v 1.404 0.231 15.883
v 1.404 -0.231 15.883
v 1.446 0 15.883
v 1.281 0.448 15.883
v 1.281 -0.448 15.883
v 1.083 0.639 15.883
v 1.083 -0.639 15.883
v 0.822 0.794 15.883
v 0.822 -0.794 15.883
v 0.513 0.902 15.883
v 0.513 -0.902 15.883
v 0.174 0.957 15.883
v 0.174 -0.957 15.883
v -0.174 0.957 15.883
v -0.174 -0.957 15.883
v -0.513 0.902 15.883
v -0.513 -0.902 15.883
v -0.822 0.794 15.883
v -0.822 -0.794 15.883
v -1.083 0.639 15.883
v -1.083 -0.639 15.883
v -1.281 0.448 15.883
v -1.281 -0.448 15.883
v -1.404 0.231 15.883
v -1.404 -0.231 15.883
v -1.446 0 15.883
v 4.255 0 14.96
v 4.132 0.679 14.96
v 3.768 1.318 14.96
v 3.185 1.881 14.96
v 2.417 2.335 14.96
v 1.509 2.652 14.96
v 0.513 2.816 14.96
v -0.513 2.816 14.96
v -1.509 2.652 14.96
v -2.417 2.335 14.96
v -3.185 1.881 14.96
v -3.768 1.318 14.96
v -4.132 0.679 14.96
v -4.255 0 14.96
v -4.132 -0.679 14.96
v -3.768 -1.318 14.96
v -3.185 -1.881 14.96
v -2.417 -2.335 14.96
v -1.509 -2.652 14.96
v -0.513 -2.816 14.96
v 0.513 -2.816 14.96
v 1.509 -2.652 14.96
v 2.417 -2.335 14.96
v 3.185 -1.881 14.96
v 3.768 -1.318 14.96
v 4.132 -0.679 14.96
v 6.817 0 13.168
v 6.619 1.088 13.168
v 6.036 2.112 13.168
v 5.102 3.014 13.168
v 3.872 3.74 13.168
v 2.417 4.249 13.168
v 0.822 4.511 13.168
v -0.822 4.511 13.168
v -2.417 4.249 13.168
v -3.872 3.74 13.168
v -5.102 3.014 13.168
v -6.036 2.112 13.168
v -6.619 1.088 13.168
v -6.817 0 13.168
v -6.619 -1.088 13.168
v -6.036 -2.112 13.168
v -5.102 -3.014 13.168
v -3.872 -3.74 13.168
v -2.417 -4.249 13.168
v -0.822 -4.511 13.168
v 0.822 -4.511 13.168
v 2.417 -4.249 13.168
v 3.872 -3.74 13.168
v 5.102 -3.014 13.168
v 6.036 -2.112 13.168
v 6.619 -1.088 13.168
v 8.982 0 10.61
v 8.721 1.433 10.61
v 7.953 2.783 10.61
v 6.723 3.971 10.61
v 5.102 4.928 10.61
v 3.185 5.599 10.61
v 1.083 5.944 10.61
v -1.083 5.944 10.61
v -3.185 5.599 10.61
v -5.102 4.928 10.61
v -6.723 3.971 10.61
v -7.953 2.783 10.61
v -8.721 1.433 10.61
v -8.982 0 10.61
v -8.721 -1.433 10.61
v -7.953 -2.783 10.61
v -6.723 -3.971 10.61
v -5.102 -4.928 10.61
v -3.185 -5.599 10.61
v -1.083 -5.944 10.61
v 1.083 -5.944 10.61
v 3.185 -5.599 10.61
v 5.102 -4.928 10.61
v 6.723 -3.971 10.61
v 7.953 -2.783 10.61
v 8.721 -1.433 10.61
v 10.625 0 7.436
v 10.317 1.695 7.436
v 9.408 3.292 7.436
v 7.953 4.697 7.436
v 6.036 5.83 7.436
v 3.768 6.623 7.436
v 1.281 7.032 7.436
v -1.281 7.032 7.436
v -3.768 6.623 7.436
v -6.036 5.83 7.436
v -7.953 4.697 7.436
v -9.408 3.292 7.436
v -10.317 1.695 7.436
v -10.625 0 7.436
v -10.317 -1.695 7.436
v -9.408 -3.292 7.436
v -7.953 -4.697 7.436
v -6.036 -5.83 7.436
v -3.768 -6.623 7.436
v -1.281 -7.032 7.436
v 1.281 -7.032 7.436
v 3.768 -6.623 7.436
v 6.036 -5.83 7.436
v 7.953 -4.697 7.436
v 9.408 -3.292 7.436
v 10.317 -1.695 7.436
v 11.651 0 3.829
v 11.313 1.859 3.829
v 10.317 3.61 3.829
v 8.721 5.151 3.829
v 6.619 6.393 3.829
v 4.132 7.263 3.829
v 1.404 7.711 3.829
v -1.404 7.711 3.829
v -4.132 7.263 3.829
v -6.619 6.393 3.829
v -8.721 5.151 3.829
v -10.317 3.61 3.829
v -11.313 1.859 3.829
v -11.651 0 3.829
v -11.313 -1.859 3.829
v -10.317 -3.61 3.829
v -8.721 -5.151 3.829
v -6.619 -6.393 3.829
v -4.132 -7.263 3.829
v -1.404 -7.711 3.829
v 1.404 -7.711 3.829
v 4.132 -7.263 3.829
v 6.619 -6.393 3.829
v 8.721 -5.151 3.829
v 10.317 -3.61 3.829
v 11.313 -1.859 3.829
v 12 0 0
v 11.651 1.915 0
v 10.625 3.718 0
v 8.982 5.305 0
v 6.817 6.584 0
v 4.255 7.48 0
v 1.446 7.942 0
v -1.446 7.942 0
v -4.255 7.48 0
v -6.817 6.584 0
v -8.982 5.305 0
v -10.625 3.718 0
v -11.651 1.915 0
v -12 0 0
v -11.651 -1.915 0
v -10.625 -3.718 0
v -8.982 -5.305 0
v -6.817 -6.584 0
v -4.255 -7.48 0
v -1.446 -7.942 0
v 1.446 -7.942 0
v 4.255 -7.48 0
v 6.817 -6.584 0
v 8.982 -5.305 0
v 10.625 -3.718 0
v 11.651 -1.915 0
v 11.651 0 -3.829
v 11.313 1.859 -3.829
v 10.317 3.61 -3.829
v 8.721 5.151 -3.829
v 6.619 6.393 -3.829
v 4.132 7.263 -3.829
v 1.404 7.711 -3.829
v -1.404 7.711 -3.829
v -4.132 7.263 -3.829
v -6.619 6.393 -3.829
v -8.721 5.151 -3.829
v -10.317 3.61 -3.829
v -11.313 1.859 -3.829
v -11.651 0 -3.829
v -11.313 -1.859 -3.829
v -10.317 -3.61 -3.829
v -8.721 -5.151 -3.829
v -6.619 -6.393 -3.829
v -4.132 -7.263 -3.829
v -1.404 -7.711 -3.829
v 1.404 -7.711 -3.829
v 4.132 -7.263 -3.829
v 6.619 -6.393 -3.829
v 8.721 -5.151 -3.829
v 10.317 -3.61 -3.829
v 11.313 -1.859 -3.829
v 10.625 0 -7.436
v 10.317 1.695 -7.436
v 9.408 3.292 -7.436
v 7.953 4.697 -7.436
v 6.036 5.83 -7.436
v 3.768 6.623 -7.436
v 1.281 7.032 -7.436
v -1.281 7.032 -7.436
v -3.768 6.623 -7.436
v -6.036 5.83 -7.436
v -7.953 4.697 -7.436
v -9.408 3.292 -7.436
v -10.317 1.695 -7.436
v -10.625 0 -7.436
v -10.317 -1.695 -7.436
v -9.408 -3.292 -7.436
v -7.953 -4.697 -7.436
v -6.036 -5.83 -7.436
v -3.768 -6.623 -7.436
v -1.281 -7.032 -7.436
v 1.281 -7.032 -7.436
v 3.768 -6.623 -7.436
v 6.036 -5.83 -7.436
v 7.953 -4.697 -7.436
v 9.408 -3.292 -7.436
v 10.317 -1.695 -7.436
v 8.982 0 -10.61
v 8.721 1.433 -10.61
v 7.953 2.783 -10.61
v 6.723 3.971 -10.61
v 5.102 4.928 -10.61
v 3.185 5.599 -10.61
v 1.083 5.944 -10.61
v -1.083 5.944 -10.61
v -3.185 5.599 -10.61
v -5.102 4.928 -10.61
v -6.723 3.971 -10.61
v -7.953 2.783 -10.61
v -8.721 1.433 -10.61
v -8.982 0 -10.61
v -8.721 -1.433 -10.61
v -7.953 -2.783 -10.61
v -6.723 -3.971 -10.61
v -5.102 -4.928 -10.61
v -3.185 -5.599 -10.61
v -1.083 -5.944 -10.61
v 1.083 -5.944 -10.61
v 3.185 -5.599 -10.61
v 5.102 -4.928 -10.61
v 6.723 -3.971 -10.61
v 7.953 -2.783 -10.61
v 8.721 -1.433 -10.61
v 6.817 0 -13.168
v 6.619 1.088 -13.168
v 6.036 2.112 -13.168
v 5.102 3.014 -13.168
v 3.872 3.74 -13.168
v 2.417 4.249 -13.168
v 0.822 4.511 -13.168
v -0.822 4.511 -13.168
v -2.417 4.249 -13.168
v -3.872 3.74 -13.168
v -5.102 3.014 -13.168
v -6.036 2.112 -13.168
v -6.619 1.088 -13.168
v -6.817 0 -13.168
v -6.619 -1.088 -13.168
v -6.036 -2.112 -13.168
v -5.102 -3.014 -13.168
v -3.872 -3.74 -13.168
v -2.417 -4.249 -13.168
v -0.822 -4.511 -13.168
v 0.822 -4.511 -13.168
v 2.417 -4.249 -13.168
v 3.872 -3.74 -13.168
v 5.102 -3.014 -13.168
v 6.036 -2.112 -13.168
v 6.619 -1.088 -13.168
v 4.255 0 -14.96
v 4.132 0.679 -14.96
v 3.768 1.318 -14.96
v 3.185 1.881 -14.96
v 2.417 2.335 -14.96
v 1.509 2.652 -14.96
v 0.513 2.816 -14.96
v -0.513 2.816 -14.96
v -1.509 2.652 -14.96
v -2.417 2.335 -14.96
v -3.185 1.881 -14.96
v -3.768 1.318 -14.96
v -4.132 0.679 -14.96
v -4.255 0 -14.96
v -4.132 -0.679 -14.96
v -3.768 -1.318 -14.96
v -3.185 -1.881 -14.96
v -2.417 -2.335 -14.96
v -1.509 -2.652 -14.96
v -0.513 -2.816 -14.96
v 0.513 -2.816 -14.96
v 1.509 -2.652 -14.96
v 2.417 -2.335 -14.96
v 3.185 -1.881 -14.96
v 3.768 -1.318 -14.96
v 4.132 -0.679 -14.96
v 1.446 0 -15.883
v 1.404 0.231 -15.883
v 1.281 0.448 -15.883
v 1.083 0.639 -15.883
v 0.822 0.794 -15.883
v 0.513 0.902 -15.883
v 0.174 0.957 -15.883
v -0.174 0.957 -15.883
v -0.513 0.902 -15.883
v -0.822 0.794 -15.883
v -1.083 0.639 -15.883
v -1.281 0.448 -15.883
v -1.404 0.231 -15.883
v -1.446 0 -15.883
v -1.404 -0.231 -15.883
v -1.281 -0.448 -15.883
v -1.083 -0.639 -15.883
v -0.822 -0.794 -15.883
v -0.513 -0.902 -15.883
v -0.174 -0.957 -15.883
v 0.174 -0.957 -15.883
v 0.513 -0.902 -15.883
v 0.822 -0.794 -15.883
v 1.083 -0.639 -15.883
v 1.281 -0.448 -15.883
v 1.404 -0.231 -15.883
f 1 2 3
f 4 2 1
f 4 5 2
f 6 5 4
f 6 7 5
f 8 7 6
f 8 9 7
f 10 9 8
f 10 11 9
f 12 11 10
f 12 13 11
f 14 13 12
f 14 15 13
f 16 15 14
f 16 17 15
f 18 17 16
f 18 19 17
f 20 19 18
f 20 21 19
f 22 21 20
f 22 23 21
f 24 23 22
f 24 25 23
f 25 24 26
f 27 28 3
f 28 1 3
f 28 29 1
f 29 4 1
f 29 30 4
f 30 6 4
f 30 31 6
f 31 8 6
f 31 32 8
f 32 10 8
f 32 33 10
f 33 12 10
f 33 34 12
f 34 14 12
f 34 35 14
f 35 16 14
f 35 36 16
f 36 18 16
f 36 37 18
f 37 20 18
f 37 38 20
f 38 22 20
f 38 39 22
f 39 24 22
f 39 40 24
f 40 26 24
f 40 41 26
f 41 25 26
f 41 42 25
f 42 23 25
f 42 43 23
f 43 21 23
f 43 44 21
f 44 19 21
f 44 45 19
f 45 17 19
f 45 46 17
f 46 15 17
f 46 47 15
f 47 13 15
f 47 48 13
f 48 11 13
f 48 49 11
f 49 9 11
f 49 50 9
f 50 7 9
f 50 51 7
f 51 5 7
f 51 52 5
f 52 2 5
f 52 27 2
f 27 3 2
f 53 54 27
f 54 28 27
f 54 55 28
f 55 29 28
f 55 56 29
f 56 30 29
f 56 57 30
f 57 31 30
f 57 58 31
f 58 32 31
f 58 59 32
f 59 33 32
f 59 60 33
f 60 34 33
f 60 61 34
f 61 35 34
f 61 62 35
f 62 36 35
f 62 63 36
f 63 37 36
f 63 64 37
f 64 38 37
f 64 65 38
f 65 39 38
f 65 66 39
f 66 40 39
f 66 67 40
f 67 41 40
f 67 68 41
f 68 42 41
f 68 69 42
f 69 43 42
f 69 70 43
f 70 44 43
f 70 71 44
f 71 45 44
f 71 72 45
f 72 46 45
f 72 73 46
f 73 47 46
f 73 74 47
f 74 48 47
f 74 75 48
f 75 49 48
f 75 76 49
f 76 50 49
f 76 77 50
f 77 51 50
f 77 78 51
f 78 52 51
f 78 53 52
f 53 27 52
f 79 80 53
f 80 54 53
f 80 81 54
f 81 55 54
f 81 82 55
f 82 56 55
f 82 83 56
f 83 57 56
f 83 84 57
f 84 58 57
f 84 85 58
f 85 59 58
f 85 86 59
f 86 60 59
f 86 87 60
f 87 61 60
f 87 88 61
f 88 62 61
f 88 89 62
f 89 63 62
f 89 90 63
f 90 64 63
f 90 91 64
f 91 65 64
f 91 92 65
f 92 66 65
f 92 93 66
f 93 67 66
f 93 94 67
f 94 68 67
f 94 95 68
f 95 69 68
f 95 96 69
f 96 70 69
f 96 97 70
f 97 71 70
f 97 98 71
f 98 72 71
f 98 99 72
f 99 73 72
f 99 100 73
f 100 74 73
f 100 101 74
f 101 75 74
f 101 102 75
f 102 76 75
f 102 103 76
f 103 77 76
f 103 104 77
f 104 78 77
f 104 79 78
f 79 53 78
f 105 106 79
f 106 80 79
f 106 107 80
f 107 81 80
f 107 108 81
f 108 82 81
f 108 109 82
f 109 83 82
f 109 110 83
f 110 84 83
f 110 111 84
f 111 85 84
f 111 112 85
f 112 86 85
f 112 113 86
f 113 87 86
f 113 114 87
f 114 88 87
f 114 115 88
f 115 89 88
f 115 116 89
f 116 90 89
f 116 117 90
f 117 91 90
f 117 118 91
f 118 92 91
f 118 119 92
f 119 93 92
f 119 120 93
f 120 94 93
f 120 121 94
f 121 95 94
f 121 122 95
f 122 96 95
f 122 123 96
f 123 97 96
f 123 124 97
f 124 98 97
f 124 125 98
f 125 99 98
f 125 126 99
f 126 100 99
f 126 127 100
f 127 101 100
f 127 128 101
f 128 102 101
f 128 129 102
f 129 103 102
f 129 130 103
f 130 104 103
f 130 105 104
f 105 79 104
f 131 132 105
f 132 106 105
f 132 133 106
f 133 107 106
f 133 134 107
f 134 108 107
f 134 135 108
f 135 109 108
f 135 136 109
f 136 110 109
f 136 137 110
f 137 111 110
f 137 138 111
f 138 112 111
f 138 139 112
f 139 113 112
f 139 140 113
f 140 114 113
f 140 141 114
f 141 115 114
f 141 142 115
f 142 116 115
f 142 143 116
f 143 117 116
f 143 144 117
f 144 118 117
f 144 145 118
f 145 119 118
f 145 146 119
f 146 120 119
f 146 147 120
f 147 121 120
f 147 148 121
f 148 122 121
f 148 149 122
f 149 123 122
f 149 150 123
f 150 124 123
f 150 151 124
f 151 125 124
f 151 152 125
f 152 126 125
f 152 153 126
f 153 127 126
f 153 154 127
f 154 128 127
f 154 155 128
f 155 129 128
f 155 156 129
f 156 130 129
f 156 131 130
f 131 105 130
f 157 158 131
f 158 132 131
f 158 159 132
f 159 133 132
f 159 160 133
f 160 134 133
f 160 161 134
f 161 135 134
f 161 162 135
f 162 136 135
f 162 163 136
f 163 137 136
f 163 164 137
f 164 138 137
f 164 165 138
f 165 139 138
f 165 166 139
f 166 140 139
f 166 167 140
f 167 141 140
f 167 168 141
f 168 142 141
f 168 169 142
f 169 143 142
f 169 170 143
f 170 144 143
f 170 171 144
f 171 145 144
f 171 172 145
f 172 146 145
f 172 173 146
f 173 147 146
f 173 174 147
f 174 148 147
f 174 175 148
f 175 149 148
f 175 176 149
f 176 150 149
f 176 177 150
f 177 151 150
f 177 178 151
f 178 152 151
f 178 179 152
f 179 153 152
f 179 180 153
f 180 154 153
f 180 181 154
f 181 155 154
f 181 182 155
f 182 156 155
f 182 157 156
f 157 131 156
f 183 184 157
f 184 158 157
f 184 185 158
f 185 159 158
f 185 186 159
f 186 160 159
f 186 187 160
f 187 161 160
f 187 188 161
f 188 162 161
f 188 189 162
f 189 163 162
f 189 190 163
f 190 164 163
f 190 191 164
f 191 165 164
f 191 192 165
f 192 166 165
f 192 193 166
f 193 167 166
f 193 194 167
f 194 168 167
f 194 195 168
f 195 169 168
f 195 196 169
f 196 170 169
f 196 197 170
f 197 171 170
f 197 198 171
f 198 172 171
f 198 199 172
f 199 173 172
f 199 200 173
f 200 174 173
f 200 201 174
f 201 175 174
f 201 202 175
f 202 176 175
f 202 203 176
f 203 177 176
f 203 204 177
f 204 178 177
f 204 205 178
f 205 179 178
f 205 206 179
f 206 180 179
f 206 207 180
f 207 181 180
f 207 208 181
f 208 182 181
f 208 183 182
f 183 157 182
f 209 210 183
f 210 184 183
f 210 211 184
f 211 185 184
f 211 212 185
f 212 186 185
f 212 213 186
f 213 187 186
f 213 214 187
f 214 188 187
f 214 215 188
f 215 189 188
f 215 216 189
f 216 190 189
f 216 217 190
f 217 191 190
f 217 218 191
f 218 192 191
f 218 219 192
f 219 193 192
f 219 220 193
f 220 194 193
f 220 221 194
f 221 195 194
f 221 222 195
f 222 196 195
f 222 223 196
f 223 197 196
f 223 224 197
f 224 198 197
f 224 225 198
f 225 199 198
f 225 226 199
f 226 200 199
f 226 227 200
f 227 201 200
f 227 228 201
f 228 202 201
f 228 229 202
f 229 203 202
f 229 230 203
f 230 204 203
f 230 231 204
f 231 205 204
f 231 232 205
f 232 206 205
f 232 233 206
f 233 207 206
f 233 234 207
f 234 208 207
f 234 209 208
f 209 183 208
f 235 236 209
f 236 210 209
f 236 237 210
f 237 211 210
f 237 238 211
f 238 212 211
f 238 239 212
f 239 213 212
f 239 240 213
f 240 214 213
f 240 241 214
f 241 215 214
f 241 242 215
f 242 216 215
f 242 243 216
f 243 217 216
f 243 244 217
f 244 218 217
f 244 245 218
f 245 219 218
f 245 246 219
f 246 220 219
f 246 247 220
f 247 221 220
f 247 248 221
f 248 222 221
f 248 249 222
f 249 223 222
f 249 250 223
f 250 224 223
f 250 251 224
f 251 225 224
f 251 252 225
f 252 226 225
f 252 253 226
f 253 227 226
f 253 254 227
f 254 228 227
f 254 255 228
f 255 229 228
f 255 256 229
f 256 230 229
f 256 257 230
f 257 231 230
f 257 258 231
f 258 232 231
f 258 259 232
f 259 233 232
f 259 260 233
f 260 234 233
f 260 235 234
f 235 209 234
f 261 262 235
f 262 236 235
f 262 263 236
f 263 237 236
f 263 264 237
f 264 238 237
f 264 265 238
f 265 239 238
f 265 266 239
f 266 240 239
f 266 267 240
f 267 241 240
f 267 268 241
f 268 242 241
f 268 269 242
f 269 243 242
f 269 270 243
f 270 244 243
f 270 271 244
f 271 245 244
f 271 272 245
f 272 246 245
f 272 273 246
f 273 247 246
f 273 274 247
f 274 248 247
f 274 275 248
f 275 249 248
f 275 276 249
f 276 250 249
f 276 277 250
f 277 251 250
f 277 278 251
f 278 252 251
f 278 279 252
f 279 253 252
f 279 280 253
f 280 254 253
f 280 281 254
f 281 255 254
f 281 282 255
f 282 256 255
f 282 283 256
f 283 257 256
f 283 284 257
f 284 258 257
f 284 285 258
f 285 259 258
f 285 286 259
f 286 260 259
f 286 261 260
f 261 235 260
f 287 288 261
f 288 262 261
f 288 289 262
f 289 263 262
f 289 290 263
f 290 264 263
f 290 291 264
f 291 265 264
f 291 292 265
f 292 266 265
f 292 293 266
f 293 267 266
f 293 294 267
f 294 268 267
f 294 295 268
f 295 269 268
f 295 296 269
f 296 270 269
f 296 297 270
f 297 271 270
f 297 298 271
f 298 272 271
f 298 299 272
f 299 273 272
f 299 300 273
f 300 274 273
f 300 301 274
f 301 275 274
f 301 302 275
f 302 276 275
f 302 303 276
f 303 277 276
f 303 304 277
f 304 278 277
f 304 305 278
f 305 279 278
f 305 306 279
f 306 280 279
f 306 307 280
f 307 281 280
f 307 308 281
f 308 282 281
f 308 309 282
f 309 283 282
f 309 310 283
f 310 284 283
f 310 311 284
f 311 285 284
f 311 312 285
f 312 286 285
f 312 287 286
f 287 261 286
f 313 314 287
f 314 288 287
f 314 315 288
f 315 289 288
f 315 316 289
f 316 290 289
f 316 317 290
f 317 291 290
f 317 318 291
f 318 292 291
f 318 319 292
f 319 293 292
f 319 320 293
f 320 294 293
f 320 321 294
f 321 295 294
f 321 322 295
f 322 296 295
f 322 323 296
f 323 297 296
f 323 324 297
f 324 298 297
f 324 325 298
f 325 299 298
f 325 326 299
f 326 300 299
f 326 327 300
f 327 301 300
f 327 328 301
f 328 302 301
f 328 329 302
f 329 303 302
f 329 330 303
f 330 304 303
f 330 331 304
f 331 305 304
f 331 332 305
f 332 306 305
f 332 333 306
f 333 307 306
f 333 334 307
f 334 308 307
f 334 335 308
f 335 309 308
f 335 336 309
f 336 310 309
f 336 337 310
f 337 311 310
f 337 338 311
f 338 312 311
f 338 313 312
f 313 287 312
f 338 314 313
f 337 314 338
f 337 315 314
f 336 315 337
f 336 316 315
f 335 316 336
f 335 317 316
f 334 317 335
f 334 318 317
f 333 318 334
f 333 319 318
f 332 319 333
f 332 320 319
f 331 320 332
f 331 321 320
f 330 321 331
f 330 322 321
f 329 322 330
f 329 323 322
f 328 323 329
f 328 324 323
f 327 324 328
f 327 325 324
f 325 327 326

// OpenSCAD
// Generated by generate_scads.py
scale([1.5,1.0,2.0]) {
  union() {
    sphere(r=8);
  }
}
